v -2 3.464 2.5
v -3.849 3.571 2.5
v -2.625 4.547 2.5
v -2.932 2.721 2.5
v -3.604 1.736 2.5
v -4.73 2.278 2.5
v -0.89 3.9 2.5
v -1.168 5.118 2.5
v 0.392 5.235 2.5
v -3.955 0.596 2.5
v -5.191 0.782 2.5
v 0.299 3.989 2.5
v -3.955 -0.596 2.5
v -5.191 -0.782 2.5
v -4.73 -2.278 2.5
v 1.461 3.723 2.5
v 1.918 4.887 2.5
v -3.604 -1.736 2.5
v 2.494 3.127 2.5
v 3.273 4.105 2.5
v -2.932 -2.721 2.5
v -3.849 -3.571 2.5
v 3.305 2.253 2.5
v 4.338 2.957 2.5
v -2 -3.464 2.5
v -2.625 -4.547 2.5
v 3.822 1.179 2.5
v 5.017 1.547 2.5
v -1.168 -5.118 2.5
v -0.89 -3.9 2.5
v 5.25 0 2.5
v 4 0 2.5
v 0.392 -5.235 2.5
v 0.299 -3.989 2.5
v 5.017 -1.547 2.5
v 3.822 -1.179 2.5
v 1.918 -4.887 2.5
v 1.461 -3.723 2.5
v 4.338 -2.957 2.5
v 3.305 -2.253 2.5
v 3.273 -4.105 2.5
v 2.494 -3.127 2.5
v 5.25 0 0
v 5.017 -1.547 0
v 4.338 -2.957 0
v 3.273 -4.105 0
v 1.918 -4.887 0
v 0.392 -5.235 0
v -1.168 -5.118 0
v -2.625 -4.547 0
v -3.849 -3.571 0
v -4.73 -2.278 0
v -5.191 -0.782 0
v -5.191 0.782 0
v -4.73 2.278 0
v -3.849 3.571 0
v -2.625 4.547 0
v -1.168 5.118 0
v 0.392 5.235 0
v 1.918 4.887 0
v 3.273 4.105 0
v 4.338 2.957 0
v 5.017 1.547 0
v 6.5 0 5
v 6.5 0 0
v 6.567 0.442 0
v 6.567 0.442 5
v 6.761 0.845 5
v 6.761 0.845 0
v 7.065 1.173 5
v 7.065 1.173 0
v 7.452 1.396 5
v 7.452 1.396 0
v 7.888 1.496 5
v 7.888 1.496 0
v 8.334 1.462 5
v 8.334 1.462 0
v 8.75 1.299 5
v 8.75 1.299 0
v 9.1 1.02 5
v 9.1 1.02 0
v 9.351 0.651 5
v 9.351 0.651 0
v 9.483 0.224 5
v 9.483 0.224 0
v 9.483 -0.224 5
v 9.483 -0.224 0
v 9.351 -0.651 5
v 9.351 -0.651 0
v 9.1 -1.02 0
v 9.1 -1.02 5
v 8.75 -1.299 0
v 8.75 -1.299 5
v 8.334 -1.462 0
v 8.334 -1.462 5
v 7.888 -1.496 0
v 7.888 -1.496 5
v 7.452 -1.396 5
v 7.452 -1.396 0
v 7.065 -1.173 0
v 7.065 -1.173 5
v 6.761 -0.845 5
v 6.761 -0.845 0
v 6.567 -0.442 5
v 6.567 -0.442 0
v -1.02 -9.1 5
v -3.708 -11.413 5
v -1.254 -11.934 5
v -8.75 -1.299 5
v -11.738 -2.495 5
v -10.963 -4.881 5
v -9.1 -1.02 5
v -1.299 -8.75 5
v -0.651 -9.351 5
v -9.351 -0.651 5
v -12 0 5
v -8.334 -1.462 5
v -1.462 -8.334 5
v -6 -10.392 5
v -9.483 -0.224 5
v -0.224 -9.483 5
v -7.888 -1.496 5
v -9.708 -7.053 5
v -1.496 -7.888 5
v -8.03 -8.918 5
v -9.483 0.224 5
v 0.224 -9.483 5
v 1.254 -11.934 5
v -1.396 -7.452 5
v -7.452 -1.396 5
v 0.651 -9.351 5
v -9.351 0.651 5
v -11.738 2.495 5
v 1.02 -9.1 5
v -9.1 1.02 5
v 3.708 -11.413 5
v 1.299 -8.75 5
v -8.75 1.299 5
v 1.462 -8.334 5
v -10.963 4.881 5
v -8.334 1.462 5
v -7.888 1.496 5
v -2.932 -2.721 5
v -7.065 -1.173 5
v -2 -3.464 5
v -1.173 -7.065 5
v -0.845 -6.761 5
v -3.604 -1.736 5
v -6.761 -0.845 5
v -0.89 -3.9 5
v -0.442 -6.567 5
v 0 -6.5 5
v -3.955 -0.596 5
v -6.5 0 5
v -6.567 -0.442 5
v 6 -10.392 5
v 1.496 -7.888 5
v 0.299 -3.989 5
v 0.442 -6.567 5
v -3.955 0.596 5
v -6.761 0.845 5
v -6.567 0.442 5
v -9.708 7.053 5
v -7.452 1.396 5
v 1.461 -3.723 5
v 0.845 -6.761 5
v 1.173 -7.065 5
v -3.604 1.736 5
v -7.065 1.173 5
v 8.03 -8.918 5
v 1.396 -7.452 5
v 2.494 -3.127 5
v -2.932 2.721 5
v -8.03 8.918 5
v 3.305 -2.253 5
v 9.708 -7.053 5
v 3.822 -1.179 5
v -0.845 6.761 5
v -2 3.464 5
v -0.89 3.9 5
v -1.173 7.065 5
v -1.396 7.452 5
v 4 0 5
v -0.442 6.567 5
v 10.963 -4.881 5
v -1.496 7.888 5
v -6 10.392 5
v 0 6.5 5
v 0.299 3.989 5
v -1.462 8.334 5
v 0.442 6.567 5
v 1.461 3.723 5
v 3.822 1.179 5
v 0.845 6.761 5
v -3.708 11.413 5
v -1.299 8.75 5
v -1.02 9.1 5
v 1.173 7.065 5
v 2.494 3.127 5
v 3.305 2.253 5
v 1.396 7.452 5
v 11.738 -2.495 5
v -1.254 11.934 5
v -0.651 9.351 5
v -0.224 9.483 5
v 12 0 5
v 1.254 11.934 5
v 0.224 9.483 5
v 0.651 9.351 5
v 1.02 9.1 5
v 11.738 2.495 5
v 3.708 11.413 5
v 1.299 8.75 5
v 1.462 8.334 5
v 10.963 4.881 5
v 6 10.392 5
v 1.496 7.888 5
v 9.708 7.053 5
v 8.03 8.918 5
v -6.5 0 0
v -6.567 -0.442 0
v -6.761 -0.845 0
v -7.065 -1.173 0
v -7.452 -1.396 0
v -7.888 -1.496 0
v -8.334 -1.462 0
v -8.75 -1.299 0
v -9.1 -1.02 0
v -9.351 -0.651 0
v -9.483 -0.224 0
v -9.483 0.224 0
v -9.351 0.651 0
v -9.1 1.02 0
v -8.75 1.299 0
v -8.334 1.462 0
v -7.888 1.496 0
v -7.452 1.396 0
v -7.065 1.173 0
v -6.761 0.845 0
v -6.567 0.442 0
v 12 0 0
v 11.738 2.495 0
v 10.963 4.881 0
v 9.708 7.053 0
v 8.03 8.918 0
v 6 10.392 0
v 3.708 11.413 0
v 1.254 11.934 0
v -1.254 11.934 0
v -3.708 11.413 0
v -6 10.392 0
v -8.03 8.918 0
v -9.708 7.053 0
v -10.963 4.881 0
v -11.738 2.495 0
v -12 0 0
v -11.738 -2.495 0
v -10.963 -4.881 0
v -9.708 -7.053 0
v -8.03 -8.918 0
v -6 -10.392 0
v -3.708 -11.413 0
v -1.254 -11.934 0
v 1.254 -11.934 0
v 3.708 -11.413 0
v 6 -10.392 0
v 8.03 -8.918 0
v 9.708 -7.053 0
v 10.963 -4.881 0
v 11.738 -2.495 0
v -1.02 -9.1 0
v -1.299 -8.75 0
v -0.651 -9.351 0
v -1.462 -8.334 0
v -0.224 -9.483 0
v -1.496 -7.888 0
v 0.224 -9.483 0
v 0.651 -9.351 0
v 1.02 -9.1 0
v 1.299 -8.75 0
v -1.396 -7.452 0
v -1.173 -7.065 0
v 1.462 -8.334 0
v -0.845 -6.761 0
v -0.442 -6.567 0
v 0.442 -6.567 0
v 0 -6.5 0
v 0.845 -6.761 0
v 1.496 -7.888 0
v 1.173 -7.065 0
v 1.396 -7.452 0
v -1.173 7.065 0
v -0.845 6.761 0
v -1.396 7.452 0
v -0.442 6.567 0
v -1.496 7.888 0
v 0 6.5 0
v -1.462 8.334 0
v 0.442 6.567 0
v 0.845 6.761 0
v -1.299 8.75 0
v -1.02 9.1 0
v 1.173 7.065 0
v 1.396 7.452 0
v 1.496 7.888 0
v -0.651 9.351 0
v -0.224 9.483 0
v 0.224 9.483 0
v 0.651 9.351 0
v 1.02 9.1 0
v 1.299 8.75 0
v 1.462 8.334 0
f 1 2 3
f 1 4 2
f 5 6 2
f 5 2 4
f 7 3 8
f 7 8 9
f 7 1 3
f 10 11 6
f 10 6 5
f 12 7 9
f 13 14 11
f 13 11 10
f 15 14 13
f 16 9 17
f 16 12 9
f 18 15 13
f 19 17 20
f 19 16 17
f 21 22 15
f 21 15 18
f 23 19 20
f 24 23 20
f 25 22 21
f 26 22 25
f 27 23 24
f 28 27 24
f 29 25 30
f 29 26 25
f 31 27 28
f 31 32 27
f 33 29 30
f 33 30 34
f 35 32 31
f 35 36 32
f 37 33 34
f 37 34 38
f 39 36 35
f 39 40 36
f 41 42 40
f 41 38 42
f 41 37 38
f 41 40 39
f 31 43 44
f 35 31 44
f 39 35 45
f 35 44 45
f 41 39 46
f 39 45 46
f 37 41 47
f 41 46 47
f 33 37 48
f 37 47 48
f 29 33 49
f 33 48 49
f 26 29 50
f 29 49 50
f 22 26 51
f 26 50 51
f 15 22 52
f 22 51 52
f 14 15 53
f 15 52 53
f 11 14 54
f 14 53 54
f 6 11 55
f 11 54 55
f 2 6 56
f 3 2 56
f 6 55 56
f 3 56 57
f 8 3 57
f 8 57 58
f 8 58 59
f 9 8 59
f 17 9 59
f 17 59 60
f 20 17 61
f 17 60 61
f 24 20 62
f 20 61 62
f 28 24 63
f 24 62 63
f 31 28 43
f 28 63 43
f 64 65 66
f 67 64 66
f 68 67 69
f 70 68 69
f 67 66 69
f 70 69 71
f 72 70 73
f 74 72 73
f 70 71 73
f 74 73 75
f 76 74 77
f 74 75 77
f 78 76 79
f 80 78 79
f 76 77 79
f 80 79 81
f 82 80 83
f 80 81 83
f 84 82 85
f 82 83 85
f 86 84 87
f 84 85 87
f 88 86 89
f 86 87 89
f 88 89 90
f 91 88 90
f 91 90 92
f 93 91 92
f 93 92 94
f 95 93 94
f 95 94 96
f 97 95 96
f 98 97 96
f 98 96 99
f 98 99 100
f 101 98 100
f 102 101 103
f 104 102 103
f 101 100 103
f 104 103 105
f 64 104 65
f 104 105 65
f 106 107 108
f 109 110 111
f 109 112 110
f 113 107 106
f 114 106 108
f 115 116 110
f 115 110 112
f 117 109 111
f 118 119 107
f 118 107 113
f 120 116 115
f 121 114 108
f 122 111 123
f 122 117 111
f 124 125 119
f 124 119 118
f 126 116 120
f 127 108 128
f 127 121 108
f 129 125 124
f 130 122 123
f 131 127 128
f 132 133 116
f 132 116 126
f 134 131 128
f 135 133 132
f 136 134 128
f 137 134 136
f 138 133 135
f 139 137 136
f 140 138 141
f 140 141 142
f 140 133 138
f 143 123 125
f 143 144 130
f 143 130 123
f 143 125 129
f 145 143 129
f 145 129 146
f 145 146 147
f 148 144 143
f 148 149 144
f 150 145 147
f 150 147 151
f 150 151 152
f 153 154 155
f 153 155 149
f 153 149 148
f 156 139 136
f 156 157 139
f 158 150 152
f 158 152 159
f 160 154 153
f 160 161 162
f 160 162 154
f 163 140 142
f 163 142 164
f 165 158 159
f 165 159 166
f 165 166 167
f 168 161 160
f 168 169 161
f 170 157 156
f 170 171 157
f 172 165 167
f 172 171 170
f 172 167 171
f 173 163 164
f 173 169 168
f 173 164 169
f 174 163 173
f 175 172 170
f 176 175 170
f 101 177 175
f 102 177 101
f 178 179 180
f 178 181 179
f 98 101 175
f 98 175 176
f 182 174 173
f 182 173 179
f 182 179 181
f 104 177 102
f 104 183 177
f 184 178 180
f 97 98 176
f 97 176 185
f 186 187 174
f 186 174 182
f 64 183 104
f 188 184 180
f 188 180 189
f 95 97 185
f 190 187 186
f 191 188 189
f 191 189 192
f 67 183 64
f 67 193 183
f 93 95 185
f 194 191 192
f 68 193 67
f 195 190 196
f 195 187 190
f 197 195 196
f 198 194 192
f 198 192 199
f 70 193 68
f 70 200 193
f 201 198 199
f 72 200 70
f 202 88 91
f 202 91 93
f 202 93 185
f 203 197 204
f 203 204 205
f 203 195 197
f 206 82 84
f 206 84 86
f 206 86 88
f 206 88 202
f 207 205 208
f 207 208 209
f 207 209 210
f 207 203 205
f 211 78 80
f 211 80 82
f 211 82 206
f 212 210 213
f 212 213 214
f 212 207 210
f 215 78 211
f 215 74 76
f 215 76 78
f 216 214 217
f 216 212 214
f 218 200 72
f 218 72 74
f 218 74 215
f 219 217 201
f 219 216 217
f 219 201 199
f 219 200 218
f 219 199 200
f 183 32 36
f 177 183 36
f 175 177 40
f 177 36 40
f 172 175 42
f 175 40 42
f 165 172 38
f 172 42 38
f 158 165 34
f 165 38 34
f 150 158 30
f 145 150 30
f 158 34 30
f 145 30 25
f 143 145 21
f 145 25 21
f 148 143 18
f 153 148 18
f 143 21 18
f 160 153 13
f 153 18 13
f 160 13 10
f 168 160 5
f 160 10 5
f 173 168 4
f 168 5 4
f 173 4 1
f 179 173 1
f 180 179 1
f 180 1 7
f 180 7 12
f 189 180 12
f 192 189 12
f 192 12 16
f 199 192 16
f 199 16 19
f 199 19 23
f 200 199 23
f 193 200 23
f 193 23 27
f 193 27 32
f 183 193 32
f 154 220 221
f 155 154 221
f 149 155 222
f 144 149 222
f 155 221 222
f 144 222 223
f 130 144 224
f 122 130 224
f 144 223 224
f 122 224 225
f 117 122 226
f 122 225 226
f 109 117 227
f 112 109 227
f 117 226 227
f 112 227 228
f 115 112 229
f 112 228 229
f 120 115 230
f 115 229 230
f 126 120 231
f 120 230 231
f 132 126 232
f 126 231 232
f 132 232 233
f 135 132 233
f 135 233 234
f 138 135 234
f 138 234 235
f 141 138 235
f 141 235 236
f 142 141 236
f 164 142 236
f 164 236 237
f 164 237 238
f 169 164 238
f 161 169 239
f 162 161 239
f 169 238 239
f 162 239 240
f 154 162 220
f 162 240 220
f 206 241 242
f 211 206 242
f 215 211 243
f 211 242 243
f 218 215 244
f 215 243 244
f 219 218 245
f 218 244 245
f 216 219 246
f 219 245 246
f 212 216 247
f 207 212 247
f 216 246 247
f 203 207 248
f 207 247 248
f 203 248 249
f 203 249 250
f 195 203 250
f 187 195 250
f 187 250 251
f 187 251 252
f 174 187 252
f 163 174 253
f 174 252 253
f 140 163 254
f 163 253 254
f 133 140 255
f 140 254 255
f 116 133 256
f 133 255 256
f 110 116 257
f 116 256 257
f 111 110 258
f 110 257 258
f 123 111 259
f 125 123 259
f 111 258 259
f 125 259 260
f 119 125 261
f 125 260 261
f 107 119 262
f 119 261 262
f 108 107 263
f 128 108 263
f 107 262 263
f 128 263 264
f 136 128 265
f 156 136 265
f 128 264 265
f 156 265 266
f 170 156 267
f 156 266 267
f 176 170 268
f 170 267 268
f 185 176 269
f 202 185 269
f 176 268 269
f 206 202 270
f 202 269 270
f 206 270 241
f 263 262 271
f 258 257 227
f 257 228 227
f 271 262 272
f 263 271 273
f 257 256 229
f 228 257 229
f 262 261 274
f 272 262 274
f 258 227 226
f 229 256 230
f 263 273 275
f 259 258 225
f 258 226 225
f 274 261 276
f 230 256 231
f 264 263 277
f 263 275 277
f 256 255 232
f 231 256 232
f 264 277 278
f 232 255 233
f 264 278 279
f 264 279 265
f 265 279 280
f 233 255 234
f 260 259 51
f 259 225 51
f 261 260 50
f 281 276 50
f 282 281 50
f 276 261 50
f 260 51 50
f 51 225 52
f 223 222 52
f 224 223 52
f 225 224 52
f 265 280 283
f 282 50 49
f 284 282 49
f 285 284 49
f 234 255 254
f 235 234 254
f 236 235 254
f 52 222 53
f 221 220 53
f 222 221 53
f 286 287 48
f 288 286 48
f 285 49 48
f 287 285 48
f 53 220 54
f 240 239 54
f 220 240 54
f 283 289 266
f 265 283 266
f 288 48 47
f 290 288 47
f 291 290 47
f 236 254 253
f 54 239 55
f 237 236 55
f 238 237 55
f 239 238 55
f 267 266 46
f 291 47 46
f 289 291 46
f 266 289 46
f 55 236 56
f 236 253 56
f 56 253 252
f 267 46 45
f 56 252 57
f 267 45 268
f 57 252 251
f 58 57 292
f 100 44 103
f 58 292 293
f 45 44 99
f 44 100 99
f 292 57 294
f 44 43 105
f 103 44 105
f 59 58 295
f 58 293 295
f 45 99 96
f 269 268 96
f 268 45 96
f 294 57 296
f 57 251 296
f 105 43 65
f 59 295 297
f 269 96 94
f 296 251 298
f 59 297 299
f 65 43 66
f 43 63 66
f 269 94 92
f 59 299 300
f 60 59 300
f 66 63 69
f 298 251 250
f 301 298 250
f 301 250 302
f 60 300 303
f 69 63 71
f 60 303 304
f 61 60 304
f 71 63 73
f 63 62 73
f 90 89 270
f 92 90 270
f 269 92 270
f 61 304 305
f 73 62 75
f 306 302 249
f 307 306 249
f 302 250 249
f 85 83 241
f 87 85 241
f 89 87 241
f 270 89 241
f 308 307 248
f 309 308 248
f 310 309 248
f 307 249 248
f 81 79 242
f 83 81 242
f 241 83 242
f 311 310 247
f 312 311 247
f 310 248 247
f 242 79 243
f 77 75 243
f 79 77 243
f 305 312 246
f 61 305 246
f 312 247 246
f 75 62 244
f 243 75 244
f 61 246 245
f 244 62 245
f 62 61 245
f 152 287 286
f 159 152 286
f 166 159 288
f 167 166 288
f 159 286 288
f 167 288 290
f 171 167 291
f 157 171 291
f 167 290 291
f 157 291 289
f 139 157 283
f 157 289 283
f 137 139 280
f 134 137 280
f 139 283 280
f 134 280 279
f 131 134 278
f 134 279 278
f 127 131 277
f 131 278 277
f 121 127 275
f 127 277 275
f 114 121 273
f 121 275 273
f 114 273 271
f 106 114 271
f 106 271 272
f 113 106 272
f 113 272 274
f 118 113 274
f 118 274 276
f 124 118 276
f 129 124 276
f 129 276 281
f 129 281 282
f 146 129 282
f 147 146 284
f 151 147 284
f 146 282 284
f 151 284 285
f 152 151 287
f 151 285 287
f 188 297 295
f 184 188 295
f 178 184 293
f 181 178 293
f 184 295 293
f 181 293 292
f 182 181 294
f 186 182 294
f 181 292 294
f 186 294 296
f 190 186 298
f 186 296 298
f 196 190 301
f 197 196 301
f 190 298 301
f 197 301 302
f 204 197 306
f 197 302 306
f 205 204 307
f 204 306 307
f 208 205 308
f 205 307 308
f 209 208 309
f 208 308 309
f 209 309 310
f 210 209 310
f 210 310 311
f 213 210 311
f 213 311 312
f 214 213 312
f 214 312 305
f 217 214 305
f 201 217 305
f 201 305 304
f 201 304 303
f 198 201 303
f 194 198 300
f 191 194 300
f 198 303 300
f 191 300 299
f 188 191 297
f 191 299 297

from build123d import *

# Parameters (mm, degrees)
F0_R            = 12
F1_DEPTH        = 5
F2_R            = 4
F3_DEPTH        = 5
F5_R            = 1.5
F6_DEPTH        = 5
F6_COPIES_COUNT = 4
F4_R            = 5.25
F7_DEPTH        = 2.5


# Not quite as in the source:
# - a pattern or mirror of a feature is missing from the dataset's text; its kind, count and spacing are read off the source's solid


with BuildPart() as f1:
    # F0 (on Top) → F1 (new body)
    with BuildSketch(Plane.XY):
        Circle(F0_R)
    extrude(amount=F1_DEPTH)

    # F2 (on face) → F3 (cut, through all)
    with BuildSketch(Plane(origin=(0, 0, 0), x_dir=(1, 0, 0), z_dir=(0, 0, -1))):
        Circle(F2_R)
    extrude(amount=-F3_DEPTH, mode=Mode.SUBTRACT)

    # F5 (on face) → F6 (cut, through all)
    with BuildSketch(Plane(origin=(0, 0, 0), x_dir=(1, 0, 0), z_dir=(0, 0, -1))):
        with Locations((-8, 0)):
            Circle(F5_R)
    f6 = extrude(amount=-F6_DEPTH, mode=Mode.SUBTRACT)

    # F6_copies: F6 ×4 about axis
    f6_copies_axis = Axis((0, 0, 0), (0, 0, 1))
    for i in range(1, F6_COPIES_COUNT):
        add(f6.rotate(f6_copies_axis, i * 360 / F6_COPIES_COUNT), mode=Mode.SUBTRACT)

    # F4 (on face) → F7 (cut)
    with BuildSketch(Plane(origin=(0, 0, 0), x_dir=(1, 0, 0), z_dir=(0, 0, -1))):
        Circle(F4_R)
    extrude(amount=-F7_DEPTH, mode=Mode.SUBTRACT)


solid = f1.part
